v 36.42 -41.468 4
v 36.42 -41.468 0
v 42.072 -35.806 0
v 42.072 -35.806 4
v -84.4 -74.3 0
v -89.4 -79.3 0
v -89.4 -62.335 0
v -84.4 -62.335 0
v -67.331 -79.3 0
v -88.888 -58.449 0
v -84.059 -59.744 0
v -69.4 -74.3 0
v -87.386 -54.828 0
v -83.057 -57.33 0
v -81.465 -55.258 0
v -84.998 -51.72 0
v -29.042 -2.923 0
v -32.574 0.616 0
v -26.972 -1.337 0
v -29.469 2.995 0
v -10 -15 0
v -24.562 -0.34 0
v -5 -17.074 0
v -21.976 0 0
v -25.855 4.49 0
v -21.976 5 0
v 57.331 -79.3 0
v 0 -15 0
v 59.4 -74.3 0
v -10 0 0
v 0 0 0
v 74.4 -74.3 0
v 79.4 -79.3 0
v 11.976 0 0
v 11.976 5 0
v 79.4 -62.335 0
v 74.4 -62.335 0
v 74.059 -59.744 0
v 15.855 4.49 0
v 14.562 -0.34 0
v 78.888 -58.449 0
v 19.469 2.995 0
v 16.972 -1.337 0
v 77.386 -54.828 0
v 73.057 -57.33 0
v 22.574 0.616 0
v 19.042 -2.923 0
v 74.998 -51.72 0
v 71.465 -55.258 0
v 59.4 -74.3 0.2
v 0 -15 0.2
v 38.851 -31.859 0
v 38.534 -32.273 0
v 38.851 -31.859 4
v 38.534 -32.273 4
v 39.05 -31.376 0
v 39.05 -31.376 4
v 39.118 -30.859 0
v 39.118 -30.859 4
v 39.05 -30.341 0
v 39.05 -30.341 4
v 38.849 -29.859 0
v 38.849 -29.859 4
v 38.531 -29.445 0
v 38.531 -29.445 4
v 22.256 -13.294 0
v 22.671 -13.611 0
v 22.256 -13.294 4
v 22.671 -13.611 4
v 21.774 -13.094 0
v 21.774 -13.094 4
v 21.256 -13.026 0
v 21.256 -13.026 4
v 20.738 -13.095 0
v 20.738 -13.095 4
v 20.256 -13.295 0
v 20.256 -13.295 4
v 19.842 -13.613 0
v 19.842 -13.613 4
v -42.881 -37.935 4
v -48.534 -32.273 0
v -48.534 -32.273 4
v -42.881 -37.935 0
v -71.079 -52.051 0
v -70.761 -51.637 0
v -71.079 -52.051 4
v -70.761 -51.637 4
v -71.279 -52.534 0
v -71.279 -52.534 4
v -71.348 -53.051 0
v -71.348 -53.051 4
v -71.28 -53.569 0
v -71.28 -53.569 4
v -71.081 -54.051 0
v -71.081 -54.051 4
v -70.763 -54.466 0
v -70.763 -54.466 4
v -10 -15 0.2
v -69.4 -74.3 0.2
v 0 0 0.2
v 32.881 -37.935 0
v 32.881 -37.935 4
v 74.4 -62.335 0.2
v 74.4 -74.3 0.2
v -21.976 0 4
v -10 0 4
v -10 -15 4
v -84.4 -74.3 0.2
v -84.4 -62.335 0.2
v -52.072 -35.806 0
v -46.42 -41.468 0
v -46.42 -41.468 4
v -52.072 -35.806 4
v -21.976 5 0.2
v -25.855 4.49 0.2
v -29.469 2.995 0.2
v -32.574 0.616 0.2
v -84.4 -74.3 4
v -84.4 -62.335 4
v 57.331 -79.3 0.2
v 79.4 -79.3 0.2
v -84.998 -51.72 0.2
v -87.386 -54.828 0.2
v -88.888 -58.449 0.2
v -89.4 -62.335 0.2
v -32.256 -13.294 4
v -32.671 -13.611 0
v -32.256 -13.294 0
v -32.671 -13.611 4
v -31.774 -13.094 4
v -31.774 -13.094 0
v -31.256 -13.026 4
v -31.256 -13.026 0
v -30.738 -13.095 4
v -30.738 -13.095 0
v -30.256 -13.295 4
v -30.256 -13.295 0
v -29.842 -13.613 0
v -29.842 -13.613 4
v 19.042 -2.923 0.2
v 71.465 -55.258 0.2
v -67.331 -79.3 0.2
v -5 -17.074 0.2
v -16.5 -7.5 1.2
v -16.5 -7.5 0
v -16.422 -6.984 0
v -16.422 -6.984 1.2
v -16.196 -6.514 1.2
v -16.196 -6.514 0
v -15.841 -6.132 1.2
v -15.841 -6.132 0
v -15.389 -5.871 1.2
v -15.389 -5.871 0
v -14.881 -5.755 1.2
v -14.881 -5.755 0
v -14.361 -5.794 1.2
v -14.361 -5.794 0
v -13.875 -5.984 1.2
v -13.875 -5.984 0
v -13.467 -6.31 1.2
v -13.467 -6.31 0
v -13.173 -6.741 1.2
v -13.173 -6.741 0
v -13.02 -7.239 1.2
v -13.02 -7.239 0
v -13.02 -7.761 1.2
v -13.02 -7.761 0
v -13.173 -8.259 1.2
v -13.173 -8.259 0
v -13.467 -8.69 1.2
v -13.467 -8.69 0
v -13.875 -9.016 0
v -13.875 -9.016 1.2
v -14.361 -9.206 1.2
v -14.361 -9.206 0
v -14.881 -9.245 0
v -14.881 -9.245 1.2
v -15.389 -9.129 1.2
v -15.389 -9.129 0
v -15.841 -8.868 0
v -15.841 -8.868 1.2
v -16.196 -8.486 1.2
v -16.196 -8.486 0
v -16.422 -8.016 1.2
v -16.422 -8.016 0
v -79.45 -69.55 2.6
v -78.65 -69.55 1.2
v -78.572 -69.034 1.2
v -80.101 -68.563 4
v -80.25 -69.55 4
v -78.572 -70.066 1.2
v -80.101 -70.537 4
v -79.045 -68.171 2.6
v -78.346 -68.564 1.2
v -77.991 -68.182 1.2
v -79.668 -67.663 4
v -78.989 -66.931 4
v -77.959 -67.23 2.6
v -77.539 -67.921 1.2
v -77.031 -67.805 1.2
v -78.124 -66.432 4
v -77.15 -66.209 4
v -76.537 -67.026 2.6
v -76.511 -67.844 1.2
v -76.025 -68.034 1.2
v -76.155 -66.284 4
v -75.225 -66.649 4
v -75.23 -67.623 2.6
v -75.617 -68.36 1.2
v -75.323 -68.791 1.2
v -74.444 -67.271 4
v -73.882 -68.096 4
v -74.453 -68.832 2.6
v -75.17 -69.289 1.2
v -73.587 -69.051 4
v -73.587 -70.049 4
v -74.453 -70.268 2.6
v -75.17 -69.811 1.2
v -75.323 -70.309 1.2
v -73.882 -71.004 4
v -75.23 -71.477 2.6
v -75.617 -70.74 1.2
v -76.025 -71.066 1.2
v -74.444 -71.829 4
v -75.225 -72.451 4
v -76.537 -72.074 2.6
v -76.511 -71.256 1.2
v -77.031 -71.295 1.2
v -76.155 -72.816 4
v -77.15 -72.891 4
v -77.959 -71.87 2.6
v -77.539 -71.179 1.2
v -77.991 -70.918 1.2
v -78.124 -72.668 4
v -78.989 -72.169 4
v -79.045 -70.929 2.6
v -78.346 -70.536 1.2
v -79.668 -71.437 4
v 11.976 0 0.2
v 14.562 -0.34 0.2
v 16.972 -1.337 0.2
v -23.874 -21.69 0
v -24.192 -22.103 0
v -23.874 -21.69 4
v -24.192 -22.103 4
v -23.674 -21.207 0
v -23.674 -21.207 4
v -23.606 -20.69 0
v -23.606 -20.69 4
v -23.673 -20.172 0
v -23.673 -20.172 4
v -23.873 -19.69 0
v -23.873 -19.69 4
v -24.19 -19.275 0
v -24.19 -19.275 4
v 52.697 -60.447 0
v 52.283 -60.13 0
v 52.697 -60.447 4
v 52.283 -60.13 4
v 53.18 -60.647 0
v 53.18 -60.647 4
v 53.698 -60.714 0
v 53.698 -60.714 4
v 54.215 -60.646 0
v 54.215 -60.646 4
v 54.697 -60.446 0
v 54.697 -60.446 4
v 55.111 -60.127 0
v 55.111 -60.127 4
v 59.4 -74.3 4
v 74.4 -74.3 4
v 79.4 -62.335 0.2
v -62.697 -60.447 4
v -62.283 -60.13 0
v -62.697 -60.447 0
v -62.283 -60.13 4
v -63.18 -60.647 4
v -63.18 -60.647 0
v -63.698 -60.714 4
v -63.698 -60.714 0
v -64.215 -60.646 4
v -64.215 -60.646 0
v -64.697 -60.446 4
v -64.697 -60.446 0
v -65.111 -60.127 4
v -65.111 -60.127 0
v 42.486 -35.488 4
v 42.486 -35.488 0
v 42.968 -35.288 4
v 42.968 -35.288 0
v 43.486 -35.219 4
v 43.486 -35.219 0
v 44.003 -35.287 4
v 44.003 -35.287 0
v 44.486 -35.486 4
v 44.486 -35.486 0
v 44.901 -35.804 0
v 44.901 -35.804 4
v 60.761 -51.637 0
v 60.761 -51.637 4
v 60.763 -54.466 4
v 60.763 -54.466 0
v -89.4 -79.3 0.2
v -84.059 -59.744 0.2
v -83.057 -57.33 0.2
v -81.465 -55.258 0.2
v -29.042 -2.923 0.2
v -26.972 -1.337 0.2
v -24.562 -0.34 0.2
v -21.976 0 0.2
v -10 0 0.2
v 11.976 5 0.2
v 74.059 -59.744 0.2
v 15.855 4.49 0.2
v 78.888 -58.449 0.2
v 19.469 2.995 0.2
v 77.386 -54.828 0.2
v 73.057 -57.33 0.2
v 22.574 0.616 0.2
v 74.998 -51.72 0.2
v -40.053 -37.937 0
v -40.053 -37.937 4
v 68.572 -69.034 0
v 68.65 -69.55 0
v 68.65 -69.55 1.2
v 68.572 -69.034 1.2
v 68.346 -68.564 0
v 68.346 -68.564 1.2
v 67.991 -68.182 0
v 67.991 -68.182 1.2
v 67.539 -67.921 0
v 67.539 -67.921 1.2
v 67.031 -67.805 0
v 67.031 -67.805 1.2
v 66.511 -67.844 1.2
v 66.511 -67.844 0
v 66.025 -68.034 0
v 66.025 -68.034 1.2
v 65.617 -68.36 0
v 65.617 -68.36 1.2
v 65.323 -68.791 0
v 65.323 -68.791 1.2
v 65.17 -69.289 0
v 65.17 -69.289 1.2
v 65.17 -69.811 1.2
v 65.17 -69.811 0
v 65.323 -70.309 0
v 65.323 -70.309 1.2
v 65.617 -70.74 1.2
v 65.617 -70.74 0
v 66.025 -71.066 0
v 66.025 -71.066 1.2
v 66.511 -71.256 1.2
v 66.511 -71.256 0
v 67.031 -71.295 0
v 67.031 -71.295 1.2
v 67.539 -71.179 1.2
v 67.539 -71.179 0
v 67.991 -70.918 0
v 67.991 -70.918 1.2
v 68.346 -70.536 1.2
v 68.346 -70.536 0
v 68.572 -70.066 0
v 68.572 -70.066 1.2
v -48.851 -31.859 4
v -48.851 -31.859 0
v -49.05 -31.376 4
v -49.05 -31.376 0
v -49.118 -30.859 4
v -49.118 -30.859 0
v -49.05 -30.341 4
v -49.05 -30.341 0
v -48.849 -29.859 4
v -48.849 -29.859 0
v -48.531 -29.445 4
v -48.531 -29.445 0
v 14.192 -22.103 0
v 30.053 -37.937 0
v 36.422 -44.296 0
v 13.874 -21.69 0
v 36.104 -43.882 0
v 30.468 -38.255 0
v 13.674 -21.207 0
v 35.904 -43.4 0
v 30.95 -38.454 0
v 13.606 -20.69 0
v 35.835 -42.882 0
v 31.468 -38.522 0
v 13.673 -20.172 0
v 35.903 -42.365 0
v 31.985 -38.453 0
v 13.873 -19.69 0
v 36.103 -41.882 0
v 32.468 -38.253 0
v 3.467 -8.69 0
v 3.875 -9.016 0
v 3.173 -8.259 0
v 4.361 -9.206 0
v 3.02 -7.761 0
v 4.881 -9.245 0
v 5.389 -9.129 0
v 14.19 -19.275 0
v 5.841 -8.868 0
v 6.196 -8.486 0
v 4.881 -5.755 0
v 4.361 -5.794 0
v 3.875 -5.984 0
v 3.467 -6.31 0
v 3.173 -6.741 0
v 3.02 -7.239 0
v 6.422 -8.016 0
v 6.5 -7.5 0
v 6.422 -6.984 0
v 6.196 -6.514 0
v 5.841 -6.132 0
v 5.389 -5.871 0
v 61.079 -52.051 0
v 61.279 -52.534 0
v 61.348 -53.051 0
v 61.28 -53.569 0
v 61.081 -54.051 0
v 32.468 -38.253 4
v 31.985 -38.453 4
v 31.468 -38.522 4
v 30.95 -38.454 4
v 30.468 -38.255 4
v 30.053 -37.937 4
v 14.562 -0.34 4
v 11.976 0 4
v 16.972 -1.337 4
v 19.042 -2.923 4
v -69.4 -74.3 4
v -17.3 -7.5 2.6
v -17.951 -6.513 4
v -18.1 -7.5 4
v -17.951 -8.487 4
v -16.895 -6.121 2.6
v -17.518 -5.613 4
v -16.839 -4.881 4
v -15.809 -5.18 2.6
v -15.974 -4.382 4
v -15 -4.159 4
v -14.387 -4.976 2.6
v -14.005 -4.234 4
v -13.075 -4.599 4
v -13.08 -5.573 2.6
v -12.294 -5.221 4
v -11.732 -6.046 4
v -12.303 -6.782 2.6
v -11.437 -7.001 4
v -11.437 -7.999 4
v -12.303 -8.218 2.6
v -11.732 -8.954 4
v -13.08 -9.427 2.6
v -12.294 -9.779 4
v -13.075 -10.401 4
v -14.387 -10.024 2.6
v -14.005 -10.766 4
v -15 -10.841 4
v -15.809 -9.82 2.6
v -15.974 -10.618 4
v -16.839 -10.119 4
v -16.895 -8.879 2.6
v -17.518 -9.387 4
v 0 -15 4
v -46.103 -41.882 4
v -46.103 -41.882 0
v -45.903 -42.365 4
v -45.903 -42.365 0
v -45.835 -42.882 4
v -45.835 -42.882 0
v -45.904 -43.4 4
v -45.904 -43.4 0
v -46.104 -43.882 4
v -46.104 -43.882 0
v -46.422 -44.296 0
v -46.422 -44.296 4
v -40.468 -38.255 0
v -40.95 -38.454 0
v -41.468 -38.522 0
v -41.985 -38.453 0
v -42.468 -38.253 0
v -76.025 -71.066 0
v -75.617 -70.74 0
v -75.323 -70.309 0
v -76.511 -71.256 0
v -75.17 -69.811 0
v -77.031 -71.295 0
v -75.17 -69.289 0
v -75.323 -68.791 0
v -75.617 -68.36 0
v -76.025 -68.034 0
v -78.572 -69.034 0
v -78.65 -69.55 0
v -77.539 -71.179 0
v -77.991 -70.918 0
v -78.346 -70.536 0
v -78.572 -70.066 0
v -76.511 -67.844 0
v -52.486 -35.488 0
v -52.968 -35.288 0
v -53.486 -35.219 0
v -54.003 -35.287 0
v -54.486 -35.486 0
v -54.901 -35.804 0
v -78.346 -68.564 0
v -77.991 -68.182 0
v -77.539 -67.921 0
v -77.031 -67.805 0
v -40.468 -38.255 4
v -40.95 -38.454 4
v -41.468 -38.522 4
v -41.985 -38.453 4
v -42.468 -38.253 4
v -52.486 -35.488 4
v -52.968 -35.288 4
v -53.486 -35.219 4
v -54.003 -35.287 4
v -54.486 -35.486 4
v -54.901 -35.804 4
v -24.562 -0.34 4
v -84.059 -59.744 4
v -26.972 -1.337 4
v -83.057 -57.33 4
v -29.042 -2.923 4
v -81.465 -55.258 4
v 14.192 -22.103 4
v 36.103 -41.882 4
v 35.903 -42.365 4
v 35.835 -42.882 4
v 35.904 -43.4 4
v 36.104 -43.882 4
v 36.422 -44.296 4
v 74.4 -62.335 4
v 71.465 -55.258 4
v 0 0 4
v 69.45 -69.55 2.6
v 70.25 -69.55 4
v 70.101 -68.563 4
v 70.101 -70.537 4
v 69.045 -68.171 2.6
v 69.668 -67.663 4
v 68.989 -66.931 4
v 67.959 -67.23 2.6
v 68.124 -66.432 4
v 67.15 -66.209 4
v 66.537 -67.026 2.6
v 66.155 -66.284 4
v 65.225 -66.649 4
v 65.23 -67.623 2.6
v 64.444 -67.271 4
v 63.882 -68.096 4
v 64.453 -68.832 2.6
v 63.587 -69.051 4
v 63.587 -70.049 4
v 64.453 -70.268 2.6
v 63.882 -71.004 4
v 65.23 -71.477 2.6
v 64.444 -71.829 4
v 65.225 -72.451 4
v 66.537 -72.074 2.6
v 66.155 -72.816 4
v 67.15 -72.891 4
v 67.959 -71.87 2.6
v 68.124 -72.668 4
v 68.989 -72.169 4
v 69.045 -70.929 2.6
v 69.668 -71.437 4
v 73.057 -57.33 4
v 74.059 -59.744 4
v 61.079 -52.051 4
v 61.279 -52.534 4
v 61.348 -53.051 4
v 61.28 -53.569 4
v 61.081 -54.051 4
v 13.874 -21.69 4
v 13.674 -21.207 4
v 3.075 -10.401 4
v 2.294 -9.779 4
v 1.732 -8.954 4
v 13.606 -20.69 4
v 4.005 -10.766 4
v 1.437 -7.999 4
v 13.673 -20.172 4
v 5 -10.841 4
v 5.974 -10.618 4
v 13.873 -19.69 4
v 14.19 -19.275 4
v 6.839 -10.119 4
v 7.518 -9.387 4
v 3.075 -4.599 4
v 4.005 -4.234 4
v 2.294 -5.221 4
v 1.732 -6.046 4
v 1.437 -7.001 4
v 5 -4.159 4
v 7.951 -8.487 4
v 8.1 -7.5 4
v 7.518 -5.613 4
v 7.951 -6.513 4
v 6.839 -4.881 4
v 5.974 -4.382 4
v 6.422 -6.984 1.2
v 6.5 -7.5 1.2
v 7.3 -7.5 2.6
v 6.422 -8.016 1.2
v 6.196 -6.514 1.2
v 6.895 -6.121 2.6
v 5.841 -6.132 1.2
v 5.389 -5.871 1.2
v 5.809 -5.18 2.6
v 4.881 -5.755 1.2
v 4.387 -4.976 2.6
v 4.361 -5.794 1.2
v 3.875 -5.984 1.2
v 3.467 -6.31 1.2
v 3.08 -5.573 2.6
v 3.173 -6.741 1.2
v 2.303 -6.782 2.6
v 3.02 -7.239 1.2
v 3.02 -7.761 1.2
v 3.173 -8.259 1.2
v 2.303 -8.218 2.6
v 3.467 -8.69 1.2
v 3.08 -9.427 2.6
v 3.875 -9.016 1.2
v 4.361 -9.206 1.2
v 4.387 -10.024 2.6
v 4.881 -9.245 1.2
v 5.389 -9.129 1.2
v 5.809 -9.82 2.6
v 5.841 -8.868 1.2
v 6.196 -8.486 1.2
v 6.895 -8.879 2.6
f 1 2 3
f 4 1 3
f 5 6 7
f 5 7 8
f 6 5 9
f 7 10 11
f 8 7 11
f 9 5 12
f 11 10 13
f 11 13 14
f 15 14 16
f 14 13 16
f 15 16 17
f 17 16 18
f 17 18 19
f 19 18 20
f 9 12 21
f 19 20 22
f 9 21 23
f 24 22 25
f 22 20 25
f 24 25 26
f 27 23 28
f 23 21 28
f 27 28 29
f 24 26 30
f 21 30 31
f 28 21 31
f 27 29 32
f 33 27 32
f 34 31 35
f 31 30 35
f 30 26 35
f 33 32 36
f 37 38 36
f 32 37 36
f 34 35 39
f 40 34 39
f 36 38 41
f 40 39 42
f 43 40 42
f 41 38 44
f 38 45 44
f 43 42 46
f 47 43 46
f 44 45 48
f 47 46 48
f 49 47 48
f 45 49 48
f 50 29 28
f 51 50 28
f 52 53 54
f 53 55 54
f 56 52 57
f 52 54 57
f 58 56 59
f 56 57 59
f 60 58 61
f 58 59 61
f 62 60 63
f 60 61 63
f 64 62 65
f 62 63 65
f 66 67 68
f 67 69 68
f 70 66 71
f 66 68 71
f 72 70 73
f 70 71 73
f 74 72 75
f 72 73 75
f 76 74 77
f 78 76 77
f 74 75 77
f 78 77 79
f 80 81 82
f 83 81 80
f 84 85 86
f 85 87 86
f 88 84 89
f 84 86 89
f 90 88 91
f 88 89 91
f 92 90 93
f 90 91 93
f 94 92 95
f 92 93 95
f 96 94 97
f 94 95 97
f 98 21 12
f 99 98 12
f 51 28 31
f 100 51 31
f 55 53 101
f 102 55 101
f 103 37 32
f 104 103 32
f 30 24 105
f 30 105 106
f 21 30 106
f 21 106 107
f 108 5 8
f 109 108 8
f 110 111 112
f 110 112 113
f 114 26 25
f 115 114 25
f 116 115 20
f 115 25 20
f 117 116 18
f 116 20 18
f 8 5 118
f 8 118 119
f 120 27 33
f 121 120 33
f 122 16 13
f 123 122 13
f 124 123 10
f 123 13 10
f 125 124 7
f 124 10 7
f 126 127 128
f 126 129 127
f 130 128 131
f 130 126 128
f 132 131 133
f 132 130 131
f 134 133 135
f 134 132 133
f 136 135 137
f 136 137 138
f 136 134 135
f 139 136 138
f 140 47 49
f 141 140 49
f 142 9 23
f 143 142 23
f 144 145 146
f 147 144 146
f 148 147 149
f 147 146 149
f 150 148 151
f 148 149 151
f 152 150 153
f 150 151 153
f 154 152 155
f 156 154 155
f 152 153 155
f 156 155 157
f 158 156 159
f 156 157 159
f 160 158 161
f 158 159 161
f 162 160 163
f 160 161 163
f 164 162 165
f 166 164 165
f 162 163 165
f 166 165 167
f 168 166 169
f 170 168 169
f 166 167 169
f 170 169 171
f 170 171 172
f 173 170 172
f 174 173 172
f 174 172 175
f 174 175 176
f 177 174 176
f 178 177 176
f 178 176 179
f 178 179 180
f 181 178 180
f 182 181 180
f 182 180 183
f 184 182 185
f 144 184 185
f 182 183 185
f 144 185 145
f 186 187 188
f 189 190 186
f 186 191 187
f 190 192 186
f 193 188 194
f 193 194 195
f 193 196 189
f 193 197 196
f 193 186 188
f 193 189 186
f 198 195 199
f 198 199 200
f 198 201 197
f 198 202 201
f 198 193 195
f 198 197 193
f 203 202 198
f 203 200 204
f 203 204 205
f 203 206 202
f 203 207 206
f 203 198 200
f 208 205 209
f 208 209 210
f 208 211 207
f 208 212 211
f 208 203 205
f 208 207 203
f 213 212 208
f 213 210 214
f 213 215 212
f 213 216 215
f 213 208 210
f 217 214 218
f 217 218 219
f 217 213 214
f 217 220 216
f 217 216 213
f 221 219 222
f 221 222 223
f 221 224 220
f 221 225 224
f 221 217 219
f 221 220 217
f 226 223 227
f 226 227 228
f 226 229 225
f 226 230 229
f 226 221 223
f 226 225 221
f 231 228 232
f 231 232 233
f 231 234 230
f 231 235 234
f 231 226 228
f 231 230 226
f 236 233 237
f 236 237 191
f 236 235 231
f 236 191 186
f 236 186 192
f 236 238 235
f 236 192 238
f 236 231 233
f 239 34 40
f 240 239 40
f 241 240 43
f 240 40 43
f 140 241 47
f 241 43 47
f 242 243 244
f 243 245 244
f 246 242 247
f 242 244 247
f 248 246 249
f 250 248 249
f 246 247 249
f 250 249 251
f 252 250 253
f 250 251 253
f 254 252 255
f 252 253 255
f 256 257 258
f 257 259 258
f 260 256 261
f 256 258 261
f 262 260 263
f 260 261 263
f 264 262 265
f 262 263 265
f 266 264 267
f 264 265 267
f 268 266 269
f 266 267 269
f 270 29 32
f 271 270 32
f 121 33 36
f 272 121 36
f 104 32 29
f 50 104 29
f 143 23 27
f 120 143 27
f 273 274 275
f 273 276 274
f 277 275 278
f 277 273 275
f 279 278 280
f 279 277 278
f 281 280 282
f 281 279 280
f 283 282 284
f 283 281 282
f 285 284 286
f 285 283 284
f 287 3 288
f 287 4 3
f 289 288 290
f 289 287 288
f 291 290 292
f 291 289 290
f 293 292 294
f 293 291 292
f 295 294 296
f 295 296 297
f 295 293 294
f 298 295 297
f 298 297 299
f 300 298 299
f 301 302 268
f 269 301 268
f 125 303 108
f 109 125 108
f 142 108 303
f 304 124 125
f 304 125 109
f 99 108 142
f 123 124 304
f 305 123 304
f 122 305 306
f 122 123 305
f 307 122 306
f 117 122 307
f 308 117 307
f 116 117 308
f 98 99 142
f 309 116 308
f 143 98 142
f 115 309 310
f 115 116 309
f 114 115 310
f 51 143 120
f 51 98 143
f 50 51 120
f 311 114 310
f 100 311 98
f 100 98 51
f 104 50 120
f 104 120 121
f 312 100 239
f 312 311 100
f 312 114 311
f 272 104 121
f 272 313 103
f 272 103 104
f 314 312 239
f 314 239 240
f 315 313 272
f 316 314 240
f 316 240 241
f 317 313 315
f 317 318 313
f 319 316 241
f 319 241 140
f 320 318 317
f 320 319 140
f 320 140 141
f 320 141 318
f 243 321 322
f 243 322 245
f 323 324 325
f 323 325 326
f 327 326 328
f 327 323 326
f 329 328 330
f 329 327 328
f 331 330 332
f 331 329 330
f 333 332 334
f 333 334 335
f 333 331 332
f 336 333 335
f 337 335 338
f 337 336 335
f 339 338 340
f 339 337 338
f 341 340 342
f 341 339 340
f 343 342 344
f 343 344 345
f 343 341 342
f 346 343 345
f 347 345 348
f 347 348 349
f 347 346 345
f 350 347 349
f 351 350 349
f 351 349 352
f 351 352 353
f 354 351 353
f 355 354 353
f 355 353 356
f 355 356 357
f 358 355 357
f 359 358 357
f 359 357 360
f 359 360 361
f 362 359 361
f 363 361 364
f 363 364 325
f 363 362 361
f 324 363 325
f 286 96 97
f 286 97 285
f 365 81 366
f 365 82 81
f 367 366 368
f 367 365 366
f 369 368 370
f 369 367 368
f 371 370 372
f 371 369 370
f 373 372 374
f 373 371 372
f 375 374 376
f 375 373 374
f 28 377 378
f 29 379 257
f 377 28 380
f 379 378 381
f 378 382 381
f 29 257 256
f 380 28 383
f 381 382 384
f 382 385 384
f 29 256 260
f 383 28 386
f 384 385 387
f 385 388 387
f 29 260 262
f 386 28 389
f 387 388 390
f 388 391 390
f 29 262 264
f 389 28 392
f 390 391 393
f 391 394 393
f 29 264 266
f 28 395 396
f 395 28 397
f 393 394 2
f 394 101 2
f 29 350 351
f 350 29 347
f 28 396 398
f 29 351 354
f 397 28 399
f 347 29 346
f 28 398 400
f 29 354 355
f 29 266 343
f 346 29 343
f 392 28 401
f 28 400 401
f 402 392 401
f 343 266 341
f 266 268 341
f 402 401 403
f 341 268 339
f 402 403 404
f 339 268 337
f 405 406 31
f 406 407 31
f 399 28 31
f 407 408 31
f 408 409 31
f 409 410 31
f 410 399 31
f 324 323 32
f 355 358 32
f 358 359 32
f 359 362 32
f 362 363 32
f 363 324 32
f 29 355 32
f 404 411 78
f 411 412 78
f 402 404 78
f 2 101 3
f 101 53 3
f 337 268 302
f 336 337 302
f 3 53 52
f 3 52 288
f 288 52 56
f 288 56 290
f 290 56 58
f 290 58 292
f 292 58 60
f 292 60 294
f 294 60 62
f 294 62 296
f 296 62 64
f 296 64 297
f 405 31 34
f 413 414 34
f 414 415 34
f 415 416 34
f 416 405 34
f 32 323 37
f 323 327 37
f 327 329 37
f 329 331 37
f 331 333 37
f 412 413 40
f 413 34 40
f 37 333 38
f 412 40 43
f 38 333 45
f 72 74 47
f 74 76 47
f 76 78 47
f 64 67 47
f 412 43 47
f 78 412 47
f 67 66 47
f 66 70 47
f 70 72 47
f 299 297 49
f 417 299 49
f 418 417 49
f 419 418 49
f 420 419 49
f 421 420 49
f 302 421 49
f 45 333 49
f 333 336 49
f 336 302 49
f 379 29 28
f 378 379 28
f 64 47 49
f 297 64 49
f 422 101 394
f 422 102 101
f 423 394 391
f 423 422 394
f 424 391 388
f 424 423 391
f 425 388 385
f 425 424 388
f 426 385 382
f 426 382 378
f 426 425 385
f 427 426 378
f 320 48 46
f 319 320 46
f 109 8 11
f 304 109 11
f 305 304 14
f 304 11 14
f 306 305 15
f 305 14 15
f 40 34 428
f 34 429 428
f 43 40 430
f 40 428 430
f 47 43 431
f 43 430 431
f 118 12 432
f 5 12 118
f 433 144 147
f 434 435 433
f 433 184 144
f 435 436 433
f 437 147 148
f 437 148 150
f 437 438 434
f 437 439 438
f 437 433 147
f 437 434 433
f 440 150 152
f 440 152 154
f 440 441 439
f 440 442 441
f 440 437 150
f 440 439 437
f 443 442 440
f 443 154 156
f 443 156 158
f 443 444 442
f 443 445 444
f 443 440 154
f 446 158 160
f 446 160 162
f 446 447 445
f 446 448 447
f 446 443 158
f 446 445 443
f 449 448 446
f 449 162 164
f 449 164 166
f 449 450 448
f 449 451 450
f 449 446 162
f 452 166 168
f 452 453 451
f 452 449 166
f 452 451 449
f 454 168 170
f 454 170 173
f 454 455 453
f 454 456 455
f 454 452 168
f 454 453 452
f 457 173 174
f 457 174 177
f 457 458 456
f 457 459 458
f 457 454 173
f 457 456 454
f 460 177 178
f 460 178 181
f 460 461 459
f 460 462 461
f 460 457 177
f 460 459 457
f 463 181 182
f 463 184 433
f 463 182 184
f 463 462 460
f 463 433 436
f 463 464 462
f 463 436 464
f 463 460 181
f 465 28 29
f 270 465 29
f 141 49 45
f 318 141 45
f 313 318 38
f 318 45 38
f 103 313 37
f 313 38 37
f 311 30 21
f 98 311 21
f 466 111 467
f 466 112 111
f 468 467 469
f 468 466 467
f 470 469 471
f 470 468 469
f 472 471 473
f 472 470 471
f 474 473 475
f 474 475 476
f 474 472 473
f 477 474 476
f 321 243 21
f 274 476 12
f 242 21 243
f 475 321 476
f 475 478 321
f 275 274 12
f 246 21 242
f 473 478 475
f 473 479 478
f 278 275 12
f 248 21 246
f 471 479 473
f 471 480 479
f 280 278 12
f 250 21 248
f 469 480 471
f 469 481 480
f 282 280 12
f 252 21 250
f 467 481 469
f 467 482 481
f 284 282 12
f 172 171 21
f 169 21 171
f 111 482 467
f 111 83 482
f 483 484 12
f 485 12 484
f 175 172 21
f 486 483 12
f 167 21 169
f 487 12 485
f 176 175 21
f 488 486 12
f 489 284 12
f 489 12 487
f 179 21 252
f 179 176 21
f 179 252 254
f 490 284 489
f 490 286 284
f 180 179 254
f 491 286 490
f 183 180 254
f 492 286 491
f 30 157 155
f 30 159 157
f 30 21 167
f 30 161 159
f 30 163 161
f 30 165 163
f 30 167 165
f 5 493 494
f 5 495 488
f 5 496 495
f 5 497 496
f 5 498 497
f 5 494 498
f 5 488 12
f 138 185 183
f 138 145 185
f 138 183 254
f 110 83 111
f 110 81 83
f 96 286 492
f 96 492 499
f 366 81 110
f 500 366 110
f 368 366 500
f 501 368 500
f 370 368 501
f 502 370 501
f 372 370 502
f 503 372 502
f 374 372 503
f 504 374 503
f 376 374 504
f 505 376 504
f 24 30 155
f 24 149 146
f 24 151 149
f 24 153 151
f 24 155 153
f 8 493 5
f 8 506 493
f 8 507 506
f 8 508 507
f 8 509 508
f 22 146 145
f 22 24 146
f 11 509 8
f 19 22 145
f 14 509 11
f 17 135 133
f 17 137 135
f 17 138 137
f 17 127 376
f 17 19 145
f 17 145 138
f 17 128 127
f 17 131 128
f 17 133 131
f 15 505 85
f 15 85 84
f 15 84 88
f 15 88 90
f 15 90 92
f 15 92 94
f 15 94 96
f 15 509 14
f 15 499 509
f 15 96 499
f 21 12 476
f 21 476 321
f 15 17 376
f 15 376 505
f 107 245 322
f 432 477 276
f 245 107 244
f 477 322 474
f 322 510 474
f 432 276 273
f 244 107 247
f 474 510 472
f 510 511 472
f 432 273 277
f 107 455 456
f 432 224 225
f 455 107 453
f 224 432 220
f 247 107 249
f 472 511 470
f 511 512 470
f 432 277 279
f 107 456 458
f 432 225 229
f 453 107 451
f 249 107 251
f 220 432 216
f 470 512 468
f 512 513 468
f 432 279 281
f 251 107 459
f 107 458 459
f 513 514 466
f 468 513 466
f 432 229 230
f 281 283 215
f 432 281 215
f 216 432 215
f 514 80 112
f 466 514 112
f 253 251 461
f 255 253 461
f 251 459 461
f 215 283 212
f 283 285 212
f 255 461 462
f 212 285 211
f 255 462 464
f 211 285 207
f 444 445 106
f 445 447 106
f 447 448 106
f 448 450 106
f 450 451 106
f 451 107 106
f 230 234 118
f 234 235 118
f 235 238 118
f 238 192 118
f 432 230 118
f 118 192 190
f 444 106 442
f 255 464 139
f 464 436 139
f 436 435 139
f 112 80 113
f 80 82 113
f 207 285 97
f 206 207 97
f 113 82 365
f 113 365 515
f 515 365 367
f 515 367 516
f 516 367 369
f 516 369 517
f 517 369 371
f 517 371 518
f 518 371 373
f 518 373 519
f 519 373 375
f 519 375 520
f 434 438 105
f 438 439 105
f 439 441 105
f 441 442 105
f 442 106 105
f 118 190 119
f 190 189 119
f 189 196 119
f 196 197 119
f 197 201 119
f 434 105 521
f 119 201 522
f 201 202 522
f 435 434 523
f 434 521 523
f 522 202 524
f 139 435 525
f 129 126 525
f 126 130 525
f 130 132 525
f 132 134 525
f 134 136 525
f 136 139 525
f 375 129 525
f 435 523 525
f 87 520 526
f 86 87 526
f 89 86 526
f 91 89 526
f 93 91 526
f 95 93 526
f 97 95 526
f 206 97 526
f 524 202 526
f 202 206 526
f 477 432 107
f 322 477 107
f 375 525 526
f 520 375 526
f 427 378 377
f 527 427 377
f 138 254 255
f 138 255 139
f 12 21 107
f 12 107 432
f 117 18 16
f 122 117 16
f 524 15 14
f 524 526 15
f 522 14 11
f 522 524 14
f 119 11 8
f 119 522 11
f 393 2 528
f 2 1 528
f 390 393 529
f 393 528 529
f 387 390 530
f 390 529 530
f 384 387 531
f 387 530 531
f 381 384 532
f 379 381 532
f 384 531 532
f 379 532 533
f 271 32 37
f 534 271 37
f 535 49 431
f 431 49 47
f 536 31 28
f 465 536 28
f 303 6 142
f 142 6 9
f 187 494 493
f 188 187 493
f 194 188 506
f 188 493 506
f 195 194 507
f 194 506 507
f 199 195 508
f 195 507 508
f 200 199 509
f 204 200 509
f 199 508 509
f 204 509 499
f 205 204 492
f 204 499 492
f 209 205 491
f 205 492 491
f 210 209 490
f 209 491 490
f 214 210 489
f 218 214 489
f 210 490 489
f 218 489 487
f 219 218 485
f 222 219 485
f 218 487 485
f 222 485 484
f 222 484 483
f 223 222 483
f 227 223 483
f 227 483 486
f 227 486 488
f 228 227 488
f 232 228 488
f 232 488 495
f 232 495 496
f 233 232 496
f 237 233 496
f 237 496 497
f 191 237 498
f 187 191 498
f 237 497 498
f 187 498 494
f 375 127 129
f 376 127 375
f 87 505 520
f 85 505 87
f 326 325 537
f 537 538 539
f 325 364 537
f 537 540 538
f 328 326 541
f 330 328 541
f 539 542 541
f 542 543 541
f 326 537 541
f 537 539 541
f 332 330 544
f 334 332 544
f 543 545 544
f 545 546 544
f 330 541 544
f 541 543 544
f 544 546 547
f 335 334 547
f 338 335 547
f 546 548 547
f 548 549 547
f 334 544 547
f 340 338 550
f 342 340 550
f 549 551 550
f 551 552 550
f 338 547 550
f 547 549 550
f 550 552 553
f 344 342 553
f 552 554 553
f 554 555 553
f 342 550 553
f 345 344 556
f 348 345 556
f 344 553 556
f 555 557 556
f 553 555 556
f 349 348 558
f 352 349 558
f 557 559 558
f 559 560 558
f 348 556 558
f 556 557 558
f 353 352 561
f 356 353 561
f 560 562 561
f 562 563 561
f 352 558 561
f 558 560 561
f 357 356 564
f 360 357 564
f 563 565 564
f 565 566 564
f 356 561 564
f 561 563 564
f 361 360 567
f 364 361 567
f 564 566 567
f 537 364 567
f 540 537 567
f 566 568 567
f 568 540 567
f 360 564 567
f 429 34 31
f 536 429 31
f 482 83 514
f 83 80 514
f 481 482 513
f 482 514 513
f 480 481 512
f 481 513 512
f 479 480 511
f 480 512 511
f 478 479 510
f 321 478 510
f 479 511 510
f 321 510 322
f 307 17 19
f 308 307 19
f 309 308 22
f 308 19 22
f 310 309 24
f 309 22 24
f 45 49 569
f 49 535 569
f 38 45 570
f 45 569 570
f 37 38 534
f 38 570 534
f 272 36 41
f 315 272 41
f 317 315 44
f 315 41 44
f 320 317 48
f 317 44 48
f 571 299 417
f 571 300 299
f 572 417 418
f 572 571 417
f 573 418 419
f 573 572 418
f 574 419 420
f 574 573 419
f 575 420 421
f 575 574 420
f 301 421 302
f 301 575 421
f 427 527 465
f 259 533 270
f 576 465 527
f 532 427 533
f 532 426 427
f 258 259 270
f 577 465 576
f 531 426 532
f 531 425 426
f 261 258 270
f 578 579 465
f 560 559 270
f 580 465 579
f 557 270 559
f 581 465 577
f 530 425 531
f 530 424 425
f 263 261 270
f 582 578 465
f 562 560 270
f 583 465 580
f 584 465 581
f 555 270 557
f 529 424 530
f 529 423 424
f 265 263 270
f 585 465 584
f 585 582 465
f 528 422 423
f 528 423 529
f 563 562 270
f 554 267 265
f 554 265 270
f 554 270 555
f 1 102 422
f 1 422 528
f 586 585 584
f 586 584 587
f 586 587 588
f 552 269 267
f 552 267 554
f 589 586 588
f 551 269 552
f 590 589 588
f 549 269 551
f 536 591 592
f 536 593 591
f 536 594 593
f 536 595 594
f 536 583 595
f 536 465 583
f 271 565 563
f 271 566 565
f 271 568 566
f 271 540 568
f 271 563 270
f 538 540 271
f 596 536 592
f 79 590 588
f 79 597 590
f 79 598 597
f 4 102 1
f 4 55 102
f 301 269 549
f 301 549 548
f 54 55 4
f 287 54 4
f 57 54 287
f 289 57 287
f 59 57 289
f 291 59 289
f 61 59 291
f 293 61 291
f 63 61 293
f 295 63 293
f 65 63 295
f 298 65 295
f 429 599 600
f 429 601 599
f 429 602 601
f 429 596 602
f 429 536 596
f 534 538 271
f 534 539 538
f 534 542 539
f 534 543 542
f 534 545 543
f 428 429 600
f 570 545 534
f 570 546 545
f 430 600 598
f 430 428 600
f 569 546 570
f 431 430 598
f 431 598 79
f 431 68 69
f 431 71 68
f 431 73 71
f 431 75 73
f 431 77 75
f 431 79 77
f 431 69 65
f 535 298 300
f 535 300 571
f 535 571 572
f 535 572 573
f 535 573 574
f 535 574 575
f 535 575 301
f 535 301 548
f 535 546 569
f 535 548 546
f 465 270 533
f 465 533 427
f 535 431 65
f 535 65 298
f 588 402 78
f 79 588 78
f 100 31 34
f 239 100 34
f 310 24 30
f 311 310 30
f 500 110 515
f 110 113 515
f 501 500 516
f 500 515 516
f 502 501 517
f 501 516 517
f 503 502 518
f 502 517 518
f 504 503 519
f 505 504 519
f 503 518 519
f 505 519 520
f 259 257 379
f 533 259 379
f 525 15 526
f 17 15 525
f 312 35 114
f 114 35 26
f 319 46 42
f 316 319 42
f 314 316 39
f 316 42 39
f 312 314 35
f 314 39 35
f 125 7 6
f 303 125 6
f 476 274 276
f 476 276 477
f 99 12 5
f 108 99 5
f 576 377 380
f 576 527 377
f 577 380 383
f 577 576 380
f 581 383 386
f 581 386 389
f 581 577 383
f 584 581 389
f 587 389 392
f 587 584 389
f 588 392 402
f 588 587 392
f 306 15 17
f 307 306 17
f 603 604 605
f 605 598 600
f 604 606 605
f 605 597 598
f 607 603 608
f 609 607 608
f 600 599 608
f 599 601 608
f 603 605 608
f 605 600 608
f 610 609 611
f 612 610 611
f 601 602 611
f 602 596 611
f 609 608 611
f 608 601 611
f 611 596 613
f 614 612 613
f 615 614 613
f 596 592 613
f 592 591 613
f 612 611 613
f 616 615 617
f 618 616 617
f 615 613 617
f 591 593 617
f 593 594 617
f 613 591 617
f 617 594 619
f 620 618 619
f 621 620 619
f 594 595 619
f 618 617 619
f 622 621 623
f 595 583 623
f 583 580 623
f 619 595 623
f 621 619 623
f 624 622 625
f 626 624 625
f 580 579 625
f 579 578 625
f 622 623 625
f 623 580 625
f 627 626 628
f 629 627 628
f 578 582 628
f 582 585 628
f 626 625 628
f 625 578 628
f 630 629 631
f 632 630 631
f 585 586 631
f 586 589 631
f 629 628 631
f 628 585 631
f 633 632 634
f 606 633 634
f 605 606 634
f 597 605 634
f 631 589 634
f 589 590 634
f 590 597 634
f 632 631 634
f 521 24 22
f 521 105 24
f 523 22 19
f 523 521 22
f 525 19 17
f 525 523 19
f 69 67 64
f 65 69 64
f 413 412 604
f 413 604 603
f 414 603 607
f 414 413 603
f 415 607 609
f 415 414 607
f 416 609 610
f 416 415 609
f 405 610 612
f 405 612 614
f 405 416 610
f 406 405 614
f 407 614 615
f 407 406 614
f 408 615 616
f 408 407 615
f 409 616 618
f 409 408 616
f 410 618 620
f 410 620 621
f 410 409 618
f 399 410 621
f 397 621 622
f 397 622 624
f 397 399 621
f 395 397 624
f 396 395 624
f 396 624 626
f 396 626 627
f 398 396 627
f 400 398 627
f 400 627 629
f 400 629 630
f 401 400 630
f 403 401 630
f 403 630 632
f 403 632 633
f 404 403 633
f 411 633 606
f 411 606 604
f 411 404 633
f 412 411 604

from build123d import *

# Parameters (mm, degrees)
F0_R     = 1.75
F1_DEPTH = 4
F2_R     = 10
F3_R     = 2
F4_SIZE2 = 1.6
F4_SIZE  = 2.8
F8_DEPTH = 0.2


with BuildPart() as f1:
    # F0 (on Top) → F1 (new body)
    with BuildSketch(Plane.XY):
        Polygon((16.113648, 0), (0, 0), (0, -15), (59.4, -74.3), (74.4, -74.3), (74.4, -58.188227), align=None)
        with Locations((66.9, -69.55)):
            Circle(F0_R, mode=Mode.SUBTRACT)
        Polygon((43.485104, -34.390495), (62.176472, -53.050396), (53.698342, -61.542823), (35.006974, -42.882922), align=None, mode=Mode.SUBTRACT)
        Polygon((31.468463, -39.350367), (12.777095, -20.690466), (21.255225, -12.198039), (39.946593, -30.857941), align=None, mode=Mode.SUBTRACT)
        with Locations((4.75, -7.5)):
            Circle(F0_R, mode=Mode.SUBTRACT)
    extrude(amount=F1_DEPTH)

    # F2
    f2_edges = [f1.edges().sort_by_distance(p)[0] for p in [
        (16.113648, 0, 2),
        (74.4, -58.188227, 2),
    ]]
    fillet(f2_edges, radius=F2_R)

    # F3
    f3_edges = [f1.edges().sort_by_distance(p)[0] for p in [
        (21.255225, -12.198039, 2),
        (12.777095, -20.690466, 2),
        (39.946593, -30.857941, 2),
        (31.468463, -39.350367, 2),
        (53.698342, -61.542823, 2),
        (62.176472, -53.050396, 2),
        (43.485104, -34.390495, 2),
        (35.006974, -42.882922, 2),
    ]]
    fillet(f3_edges, radius=F3_R)

    # F4
    f4_edges = [f1.edges().sort_by_distance(p)[0] for p in [
        (3, -7.5, 4),
        (65.15, -69.55, 4),
    ]]
    chamfer(f4_edges, length=F4_SIZE, length2=F4_SIZE2)


with BuildPart() as f6_1:
    # F6: instance of F1
    add(f1.part.mirror(Plane.YZ.offset(-5)))


with BuildPart() as f8:
    # F7 (on Top) → F8 (new body)
    with BuildSketch(Plane.XY):
        with BuildLine():
            Line((-32.574108, 0.615534), (-84.997662, -51.719765))
            ThreePointArc((-84.997662, -51.719765), (-88.255774, -56.58921), (-89.4, -62.335299))
            Line((-89.4, -62.335299), (-89.4, -79.3))
            Line((-89.4, -79.3), (-67.331399, -79.3))
            Line((-67.331399, -79.3), (-5, -17.073536))
            Line((-5, -17.073536), (57.331399, -79.3))
            Line((57.331399, -79.3), (79.4, -79.3))
            Line((79.4, -79.3), (79.4, -62.335299))
            ThreePointArc((79.4, -62.335299), (78.255774, -56.58921), (74.997662, -51.719765))
            Line((74.997662, -51.719765), (22.574108, 0.615534))
            ThreePointArc((22.574108, 0.615534), (17.71086, 3.86061), (11.976446, 5))
            Line((11.976446, 5), (-21.976446, 5))
            ThreePointArc((-21.976446, 5), (-27.71086, 3.86061), (-32.574108, 0.615534))
        make_face()
        with BuildLine():
            Line((-69.4, -74.3), (-84.4, -74.3))
            Line((-84.4, -74.3), (-84.4, -62.335299))
            ThreePointArc((-84.4, -62.335299), (-83.637183, -58.504573), (-81.465108, -55.258276))
            Line((-81.465108, -55.258276), (-29.041554, -2.922978))
            ThreePointArc((-29.041554, -2.922978), (-25.799388, -0.759594), (-21.976446, 0))
            Line((-21.976446, 0), (-10, 0))
            Line((-10, 0), (-10, -15))
            Line((-10, -15), (-69.4, -74.3))
        make_face(mode=Mode.SUBTRACT)
        with BuildLine():
            Line((0, -15), (0, 0))
            Line((0, 0), (11.976446, 0))
            ThreePointArc((11.976446, 0), (15.799388, -0.759594), (19.041554, -2.922978))
            Line((19.041554, -2.922978), (71.465108, -55.258276))
            ThreePointArc((71.465108, -55.258276), (73.637183, -58.504573), (74.4, -62.335299))
            Line((74.4, -62.335299), (74.4, -74.3))
            Line((74.4, -74.3), (59.4, -74.3))
            Line((59.4, -74.3), (0, -15))
        make_face(mode=Mode.SUBTRACT)
    extrude(amount=F8_DEPTH)


solid = Compound([f1.part, f6_1.part, f8.part])
